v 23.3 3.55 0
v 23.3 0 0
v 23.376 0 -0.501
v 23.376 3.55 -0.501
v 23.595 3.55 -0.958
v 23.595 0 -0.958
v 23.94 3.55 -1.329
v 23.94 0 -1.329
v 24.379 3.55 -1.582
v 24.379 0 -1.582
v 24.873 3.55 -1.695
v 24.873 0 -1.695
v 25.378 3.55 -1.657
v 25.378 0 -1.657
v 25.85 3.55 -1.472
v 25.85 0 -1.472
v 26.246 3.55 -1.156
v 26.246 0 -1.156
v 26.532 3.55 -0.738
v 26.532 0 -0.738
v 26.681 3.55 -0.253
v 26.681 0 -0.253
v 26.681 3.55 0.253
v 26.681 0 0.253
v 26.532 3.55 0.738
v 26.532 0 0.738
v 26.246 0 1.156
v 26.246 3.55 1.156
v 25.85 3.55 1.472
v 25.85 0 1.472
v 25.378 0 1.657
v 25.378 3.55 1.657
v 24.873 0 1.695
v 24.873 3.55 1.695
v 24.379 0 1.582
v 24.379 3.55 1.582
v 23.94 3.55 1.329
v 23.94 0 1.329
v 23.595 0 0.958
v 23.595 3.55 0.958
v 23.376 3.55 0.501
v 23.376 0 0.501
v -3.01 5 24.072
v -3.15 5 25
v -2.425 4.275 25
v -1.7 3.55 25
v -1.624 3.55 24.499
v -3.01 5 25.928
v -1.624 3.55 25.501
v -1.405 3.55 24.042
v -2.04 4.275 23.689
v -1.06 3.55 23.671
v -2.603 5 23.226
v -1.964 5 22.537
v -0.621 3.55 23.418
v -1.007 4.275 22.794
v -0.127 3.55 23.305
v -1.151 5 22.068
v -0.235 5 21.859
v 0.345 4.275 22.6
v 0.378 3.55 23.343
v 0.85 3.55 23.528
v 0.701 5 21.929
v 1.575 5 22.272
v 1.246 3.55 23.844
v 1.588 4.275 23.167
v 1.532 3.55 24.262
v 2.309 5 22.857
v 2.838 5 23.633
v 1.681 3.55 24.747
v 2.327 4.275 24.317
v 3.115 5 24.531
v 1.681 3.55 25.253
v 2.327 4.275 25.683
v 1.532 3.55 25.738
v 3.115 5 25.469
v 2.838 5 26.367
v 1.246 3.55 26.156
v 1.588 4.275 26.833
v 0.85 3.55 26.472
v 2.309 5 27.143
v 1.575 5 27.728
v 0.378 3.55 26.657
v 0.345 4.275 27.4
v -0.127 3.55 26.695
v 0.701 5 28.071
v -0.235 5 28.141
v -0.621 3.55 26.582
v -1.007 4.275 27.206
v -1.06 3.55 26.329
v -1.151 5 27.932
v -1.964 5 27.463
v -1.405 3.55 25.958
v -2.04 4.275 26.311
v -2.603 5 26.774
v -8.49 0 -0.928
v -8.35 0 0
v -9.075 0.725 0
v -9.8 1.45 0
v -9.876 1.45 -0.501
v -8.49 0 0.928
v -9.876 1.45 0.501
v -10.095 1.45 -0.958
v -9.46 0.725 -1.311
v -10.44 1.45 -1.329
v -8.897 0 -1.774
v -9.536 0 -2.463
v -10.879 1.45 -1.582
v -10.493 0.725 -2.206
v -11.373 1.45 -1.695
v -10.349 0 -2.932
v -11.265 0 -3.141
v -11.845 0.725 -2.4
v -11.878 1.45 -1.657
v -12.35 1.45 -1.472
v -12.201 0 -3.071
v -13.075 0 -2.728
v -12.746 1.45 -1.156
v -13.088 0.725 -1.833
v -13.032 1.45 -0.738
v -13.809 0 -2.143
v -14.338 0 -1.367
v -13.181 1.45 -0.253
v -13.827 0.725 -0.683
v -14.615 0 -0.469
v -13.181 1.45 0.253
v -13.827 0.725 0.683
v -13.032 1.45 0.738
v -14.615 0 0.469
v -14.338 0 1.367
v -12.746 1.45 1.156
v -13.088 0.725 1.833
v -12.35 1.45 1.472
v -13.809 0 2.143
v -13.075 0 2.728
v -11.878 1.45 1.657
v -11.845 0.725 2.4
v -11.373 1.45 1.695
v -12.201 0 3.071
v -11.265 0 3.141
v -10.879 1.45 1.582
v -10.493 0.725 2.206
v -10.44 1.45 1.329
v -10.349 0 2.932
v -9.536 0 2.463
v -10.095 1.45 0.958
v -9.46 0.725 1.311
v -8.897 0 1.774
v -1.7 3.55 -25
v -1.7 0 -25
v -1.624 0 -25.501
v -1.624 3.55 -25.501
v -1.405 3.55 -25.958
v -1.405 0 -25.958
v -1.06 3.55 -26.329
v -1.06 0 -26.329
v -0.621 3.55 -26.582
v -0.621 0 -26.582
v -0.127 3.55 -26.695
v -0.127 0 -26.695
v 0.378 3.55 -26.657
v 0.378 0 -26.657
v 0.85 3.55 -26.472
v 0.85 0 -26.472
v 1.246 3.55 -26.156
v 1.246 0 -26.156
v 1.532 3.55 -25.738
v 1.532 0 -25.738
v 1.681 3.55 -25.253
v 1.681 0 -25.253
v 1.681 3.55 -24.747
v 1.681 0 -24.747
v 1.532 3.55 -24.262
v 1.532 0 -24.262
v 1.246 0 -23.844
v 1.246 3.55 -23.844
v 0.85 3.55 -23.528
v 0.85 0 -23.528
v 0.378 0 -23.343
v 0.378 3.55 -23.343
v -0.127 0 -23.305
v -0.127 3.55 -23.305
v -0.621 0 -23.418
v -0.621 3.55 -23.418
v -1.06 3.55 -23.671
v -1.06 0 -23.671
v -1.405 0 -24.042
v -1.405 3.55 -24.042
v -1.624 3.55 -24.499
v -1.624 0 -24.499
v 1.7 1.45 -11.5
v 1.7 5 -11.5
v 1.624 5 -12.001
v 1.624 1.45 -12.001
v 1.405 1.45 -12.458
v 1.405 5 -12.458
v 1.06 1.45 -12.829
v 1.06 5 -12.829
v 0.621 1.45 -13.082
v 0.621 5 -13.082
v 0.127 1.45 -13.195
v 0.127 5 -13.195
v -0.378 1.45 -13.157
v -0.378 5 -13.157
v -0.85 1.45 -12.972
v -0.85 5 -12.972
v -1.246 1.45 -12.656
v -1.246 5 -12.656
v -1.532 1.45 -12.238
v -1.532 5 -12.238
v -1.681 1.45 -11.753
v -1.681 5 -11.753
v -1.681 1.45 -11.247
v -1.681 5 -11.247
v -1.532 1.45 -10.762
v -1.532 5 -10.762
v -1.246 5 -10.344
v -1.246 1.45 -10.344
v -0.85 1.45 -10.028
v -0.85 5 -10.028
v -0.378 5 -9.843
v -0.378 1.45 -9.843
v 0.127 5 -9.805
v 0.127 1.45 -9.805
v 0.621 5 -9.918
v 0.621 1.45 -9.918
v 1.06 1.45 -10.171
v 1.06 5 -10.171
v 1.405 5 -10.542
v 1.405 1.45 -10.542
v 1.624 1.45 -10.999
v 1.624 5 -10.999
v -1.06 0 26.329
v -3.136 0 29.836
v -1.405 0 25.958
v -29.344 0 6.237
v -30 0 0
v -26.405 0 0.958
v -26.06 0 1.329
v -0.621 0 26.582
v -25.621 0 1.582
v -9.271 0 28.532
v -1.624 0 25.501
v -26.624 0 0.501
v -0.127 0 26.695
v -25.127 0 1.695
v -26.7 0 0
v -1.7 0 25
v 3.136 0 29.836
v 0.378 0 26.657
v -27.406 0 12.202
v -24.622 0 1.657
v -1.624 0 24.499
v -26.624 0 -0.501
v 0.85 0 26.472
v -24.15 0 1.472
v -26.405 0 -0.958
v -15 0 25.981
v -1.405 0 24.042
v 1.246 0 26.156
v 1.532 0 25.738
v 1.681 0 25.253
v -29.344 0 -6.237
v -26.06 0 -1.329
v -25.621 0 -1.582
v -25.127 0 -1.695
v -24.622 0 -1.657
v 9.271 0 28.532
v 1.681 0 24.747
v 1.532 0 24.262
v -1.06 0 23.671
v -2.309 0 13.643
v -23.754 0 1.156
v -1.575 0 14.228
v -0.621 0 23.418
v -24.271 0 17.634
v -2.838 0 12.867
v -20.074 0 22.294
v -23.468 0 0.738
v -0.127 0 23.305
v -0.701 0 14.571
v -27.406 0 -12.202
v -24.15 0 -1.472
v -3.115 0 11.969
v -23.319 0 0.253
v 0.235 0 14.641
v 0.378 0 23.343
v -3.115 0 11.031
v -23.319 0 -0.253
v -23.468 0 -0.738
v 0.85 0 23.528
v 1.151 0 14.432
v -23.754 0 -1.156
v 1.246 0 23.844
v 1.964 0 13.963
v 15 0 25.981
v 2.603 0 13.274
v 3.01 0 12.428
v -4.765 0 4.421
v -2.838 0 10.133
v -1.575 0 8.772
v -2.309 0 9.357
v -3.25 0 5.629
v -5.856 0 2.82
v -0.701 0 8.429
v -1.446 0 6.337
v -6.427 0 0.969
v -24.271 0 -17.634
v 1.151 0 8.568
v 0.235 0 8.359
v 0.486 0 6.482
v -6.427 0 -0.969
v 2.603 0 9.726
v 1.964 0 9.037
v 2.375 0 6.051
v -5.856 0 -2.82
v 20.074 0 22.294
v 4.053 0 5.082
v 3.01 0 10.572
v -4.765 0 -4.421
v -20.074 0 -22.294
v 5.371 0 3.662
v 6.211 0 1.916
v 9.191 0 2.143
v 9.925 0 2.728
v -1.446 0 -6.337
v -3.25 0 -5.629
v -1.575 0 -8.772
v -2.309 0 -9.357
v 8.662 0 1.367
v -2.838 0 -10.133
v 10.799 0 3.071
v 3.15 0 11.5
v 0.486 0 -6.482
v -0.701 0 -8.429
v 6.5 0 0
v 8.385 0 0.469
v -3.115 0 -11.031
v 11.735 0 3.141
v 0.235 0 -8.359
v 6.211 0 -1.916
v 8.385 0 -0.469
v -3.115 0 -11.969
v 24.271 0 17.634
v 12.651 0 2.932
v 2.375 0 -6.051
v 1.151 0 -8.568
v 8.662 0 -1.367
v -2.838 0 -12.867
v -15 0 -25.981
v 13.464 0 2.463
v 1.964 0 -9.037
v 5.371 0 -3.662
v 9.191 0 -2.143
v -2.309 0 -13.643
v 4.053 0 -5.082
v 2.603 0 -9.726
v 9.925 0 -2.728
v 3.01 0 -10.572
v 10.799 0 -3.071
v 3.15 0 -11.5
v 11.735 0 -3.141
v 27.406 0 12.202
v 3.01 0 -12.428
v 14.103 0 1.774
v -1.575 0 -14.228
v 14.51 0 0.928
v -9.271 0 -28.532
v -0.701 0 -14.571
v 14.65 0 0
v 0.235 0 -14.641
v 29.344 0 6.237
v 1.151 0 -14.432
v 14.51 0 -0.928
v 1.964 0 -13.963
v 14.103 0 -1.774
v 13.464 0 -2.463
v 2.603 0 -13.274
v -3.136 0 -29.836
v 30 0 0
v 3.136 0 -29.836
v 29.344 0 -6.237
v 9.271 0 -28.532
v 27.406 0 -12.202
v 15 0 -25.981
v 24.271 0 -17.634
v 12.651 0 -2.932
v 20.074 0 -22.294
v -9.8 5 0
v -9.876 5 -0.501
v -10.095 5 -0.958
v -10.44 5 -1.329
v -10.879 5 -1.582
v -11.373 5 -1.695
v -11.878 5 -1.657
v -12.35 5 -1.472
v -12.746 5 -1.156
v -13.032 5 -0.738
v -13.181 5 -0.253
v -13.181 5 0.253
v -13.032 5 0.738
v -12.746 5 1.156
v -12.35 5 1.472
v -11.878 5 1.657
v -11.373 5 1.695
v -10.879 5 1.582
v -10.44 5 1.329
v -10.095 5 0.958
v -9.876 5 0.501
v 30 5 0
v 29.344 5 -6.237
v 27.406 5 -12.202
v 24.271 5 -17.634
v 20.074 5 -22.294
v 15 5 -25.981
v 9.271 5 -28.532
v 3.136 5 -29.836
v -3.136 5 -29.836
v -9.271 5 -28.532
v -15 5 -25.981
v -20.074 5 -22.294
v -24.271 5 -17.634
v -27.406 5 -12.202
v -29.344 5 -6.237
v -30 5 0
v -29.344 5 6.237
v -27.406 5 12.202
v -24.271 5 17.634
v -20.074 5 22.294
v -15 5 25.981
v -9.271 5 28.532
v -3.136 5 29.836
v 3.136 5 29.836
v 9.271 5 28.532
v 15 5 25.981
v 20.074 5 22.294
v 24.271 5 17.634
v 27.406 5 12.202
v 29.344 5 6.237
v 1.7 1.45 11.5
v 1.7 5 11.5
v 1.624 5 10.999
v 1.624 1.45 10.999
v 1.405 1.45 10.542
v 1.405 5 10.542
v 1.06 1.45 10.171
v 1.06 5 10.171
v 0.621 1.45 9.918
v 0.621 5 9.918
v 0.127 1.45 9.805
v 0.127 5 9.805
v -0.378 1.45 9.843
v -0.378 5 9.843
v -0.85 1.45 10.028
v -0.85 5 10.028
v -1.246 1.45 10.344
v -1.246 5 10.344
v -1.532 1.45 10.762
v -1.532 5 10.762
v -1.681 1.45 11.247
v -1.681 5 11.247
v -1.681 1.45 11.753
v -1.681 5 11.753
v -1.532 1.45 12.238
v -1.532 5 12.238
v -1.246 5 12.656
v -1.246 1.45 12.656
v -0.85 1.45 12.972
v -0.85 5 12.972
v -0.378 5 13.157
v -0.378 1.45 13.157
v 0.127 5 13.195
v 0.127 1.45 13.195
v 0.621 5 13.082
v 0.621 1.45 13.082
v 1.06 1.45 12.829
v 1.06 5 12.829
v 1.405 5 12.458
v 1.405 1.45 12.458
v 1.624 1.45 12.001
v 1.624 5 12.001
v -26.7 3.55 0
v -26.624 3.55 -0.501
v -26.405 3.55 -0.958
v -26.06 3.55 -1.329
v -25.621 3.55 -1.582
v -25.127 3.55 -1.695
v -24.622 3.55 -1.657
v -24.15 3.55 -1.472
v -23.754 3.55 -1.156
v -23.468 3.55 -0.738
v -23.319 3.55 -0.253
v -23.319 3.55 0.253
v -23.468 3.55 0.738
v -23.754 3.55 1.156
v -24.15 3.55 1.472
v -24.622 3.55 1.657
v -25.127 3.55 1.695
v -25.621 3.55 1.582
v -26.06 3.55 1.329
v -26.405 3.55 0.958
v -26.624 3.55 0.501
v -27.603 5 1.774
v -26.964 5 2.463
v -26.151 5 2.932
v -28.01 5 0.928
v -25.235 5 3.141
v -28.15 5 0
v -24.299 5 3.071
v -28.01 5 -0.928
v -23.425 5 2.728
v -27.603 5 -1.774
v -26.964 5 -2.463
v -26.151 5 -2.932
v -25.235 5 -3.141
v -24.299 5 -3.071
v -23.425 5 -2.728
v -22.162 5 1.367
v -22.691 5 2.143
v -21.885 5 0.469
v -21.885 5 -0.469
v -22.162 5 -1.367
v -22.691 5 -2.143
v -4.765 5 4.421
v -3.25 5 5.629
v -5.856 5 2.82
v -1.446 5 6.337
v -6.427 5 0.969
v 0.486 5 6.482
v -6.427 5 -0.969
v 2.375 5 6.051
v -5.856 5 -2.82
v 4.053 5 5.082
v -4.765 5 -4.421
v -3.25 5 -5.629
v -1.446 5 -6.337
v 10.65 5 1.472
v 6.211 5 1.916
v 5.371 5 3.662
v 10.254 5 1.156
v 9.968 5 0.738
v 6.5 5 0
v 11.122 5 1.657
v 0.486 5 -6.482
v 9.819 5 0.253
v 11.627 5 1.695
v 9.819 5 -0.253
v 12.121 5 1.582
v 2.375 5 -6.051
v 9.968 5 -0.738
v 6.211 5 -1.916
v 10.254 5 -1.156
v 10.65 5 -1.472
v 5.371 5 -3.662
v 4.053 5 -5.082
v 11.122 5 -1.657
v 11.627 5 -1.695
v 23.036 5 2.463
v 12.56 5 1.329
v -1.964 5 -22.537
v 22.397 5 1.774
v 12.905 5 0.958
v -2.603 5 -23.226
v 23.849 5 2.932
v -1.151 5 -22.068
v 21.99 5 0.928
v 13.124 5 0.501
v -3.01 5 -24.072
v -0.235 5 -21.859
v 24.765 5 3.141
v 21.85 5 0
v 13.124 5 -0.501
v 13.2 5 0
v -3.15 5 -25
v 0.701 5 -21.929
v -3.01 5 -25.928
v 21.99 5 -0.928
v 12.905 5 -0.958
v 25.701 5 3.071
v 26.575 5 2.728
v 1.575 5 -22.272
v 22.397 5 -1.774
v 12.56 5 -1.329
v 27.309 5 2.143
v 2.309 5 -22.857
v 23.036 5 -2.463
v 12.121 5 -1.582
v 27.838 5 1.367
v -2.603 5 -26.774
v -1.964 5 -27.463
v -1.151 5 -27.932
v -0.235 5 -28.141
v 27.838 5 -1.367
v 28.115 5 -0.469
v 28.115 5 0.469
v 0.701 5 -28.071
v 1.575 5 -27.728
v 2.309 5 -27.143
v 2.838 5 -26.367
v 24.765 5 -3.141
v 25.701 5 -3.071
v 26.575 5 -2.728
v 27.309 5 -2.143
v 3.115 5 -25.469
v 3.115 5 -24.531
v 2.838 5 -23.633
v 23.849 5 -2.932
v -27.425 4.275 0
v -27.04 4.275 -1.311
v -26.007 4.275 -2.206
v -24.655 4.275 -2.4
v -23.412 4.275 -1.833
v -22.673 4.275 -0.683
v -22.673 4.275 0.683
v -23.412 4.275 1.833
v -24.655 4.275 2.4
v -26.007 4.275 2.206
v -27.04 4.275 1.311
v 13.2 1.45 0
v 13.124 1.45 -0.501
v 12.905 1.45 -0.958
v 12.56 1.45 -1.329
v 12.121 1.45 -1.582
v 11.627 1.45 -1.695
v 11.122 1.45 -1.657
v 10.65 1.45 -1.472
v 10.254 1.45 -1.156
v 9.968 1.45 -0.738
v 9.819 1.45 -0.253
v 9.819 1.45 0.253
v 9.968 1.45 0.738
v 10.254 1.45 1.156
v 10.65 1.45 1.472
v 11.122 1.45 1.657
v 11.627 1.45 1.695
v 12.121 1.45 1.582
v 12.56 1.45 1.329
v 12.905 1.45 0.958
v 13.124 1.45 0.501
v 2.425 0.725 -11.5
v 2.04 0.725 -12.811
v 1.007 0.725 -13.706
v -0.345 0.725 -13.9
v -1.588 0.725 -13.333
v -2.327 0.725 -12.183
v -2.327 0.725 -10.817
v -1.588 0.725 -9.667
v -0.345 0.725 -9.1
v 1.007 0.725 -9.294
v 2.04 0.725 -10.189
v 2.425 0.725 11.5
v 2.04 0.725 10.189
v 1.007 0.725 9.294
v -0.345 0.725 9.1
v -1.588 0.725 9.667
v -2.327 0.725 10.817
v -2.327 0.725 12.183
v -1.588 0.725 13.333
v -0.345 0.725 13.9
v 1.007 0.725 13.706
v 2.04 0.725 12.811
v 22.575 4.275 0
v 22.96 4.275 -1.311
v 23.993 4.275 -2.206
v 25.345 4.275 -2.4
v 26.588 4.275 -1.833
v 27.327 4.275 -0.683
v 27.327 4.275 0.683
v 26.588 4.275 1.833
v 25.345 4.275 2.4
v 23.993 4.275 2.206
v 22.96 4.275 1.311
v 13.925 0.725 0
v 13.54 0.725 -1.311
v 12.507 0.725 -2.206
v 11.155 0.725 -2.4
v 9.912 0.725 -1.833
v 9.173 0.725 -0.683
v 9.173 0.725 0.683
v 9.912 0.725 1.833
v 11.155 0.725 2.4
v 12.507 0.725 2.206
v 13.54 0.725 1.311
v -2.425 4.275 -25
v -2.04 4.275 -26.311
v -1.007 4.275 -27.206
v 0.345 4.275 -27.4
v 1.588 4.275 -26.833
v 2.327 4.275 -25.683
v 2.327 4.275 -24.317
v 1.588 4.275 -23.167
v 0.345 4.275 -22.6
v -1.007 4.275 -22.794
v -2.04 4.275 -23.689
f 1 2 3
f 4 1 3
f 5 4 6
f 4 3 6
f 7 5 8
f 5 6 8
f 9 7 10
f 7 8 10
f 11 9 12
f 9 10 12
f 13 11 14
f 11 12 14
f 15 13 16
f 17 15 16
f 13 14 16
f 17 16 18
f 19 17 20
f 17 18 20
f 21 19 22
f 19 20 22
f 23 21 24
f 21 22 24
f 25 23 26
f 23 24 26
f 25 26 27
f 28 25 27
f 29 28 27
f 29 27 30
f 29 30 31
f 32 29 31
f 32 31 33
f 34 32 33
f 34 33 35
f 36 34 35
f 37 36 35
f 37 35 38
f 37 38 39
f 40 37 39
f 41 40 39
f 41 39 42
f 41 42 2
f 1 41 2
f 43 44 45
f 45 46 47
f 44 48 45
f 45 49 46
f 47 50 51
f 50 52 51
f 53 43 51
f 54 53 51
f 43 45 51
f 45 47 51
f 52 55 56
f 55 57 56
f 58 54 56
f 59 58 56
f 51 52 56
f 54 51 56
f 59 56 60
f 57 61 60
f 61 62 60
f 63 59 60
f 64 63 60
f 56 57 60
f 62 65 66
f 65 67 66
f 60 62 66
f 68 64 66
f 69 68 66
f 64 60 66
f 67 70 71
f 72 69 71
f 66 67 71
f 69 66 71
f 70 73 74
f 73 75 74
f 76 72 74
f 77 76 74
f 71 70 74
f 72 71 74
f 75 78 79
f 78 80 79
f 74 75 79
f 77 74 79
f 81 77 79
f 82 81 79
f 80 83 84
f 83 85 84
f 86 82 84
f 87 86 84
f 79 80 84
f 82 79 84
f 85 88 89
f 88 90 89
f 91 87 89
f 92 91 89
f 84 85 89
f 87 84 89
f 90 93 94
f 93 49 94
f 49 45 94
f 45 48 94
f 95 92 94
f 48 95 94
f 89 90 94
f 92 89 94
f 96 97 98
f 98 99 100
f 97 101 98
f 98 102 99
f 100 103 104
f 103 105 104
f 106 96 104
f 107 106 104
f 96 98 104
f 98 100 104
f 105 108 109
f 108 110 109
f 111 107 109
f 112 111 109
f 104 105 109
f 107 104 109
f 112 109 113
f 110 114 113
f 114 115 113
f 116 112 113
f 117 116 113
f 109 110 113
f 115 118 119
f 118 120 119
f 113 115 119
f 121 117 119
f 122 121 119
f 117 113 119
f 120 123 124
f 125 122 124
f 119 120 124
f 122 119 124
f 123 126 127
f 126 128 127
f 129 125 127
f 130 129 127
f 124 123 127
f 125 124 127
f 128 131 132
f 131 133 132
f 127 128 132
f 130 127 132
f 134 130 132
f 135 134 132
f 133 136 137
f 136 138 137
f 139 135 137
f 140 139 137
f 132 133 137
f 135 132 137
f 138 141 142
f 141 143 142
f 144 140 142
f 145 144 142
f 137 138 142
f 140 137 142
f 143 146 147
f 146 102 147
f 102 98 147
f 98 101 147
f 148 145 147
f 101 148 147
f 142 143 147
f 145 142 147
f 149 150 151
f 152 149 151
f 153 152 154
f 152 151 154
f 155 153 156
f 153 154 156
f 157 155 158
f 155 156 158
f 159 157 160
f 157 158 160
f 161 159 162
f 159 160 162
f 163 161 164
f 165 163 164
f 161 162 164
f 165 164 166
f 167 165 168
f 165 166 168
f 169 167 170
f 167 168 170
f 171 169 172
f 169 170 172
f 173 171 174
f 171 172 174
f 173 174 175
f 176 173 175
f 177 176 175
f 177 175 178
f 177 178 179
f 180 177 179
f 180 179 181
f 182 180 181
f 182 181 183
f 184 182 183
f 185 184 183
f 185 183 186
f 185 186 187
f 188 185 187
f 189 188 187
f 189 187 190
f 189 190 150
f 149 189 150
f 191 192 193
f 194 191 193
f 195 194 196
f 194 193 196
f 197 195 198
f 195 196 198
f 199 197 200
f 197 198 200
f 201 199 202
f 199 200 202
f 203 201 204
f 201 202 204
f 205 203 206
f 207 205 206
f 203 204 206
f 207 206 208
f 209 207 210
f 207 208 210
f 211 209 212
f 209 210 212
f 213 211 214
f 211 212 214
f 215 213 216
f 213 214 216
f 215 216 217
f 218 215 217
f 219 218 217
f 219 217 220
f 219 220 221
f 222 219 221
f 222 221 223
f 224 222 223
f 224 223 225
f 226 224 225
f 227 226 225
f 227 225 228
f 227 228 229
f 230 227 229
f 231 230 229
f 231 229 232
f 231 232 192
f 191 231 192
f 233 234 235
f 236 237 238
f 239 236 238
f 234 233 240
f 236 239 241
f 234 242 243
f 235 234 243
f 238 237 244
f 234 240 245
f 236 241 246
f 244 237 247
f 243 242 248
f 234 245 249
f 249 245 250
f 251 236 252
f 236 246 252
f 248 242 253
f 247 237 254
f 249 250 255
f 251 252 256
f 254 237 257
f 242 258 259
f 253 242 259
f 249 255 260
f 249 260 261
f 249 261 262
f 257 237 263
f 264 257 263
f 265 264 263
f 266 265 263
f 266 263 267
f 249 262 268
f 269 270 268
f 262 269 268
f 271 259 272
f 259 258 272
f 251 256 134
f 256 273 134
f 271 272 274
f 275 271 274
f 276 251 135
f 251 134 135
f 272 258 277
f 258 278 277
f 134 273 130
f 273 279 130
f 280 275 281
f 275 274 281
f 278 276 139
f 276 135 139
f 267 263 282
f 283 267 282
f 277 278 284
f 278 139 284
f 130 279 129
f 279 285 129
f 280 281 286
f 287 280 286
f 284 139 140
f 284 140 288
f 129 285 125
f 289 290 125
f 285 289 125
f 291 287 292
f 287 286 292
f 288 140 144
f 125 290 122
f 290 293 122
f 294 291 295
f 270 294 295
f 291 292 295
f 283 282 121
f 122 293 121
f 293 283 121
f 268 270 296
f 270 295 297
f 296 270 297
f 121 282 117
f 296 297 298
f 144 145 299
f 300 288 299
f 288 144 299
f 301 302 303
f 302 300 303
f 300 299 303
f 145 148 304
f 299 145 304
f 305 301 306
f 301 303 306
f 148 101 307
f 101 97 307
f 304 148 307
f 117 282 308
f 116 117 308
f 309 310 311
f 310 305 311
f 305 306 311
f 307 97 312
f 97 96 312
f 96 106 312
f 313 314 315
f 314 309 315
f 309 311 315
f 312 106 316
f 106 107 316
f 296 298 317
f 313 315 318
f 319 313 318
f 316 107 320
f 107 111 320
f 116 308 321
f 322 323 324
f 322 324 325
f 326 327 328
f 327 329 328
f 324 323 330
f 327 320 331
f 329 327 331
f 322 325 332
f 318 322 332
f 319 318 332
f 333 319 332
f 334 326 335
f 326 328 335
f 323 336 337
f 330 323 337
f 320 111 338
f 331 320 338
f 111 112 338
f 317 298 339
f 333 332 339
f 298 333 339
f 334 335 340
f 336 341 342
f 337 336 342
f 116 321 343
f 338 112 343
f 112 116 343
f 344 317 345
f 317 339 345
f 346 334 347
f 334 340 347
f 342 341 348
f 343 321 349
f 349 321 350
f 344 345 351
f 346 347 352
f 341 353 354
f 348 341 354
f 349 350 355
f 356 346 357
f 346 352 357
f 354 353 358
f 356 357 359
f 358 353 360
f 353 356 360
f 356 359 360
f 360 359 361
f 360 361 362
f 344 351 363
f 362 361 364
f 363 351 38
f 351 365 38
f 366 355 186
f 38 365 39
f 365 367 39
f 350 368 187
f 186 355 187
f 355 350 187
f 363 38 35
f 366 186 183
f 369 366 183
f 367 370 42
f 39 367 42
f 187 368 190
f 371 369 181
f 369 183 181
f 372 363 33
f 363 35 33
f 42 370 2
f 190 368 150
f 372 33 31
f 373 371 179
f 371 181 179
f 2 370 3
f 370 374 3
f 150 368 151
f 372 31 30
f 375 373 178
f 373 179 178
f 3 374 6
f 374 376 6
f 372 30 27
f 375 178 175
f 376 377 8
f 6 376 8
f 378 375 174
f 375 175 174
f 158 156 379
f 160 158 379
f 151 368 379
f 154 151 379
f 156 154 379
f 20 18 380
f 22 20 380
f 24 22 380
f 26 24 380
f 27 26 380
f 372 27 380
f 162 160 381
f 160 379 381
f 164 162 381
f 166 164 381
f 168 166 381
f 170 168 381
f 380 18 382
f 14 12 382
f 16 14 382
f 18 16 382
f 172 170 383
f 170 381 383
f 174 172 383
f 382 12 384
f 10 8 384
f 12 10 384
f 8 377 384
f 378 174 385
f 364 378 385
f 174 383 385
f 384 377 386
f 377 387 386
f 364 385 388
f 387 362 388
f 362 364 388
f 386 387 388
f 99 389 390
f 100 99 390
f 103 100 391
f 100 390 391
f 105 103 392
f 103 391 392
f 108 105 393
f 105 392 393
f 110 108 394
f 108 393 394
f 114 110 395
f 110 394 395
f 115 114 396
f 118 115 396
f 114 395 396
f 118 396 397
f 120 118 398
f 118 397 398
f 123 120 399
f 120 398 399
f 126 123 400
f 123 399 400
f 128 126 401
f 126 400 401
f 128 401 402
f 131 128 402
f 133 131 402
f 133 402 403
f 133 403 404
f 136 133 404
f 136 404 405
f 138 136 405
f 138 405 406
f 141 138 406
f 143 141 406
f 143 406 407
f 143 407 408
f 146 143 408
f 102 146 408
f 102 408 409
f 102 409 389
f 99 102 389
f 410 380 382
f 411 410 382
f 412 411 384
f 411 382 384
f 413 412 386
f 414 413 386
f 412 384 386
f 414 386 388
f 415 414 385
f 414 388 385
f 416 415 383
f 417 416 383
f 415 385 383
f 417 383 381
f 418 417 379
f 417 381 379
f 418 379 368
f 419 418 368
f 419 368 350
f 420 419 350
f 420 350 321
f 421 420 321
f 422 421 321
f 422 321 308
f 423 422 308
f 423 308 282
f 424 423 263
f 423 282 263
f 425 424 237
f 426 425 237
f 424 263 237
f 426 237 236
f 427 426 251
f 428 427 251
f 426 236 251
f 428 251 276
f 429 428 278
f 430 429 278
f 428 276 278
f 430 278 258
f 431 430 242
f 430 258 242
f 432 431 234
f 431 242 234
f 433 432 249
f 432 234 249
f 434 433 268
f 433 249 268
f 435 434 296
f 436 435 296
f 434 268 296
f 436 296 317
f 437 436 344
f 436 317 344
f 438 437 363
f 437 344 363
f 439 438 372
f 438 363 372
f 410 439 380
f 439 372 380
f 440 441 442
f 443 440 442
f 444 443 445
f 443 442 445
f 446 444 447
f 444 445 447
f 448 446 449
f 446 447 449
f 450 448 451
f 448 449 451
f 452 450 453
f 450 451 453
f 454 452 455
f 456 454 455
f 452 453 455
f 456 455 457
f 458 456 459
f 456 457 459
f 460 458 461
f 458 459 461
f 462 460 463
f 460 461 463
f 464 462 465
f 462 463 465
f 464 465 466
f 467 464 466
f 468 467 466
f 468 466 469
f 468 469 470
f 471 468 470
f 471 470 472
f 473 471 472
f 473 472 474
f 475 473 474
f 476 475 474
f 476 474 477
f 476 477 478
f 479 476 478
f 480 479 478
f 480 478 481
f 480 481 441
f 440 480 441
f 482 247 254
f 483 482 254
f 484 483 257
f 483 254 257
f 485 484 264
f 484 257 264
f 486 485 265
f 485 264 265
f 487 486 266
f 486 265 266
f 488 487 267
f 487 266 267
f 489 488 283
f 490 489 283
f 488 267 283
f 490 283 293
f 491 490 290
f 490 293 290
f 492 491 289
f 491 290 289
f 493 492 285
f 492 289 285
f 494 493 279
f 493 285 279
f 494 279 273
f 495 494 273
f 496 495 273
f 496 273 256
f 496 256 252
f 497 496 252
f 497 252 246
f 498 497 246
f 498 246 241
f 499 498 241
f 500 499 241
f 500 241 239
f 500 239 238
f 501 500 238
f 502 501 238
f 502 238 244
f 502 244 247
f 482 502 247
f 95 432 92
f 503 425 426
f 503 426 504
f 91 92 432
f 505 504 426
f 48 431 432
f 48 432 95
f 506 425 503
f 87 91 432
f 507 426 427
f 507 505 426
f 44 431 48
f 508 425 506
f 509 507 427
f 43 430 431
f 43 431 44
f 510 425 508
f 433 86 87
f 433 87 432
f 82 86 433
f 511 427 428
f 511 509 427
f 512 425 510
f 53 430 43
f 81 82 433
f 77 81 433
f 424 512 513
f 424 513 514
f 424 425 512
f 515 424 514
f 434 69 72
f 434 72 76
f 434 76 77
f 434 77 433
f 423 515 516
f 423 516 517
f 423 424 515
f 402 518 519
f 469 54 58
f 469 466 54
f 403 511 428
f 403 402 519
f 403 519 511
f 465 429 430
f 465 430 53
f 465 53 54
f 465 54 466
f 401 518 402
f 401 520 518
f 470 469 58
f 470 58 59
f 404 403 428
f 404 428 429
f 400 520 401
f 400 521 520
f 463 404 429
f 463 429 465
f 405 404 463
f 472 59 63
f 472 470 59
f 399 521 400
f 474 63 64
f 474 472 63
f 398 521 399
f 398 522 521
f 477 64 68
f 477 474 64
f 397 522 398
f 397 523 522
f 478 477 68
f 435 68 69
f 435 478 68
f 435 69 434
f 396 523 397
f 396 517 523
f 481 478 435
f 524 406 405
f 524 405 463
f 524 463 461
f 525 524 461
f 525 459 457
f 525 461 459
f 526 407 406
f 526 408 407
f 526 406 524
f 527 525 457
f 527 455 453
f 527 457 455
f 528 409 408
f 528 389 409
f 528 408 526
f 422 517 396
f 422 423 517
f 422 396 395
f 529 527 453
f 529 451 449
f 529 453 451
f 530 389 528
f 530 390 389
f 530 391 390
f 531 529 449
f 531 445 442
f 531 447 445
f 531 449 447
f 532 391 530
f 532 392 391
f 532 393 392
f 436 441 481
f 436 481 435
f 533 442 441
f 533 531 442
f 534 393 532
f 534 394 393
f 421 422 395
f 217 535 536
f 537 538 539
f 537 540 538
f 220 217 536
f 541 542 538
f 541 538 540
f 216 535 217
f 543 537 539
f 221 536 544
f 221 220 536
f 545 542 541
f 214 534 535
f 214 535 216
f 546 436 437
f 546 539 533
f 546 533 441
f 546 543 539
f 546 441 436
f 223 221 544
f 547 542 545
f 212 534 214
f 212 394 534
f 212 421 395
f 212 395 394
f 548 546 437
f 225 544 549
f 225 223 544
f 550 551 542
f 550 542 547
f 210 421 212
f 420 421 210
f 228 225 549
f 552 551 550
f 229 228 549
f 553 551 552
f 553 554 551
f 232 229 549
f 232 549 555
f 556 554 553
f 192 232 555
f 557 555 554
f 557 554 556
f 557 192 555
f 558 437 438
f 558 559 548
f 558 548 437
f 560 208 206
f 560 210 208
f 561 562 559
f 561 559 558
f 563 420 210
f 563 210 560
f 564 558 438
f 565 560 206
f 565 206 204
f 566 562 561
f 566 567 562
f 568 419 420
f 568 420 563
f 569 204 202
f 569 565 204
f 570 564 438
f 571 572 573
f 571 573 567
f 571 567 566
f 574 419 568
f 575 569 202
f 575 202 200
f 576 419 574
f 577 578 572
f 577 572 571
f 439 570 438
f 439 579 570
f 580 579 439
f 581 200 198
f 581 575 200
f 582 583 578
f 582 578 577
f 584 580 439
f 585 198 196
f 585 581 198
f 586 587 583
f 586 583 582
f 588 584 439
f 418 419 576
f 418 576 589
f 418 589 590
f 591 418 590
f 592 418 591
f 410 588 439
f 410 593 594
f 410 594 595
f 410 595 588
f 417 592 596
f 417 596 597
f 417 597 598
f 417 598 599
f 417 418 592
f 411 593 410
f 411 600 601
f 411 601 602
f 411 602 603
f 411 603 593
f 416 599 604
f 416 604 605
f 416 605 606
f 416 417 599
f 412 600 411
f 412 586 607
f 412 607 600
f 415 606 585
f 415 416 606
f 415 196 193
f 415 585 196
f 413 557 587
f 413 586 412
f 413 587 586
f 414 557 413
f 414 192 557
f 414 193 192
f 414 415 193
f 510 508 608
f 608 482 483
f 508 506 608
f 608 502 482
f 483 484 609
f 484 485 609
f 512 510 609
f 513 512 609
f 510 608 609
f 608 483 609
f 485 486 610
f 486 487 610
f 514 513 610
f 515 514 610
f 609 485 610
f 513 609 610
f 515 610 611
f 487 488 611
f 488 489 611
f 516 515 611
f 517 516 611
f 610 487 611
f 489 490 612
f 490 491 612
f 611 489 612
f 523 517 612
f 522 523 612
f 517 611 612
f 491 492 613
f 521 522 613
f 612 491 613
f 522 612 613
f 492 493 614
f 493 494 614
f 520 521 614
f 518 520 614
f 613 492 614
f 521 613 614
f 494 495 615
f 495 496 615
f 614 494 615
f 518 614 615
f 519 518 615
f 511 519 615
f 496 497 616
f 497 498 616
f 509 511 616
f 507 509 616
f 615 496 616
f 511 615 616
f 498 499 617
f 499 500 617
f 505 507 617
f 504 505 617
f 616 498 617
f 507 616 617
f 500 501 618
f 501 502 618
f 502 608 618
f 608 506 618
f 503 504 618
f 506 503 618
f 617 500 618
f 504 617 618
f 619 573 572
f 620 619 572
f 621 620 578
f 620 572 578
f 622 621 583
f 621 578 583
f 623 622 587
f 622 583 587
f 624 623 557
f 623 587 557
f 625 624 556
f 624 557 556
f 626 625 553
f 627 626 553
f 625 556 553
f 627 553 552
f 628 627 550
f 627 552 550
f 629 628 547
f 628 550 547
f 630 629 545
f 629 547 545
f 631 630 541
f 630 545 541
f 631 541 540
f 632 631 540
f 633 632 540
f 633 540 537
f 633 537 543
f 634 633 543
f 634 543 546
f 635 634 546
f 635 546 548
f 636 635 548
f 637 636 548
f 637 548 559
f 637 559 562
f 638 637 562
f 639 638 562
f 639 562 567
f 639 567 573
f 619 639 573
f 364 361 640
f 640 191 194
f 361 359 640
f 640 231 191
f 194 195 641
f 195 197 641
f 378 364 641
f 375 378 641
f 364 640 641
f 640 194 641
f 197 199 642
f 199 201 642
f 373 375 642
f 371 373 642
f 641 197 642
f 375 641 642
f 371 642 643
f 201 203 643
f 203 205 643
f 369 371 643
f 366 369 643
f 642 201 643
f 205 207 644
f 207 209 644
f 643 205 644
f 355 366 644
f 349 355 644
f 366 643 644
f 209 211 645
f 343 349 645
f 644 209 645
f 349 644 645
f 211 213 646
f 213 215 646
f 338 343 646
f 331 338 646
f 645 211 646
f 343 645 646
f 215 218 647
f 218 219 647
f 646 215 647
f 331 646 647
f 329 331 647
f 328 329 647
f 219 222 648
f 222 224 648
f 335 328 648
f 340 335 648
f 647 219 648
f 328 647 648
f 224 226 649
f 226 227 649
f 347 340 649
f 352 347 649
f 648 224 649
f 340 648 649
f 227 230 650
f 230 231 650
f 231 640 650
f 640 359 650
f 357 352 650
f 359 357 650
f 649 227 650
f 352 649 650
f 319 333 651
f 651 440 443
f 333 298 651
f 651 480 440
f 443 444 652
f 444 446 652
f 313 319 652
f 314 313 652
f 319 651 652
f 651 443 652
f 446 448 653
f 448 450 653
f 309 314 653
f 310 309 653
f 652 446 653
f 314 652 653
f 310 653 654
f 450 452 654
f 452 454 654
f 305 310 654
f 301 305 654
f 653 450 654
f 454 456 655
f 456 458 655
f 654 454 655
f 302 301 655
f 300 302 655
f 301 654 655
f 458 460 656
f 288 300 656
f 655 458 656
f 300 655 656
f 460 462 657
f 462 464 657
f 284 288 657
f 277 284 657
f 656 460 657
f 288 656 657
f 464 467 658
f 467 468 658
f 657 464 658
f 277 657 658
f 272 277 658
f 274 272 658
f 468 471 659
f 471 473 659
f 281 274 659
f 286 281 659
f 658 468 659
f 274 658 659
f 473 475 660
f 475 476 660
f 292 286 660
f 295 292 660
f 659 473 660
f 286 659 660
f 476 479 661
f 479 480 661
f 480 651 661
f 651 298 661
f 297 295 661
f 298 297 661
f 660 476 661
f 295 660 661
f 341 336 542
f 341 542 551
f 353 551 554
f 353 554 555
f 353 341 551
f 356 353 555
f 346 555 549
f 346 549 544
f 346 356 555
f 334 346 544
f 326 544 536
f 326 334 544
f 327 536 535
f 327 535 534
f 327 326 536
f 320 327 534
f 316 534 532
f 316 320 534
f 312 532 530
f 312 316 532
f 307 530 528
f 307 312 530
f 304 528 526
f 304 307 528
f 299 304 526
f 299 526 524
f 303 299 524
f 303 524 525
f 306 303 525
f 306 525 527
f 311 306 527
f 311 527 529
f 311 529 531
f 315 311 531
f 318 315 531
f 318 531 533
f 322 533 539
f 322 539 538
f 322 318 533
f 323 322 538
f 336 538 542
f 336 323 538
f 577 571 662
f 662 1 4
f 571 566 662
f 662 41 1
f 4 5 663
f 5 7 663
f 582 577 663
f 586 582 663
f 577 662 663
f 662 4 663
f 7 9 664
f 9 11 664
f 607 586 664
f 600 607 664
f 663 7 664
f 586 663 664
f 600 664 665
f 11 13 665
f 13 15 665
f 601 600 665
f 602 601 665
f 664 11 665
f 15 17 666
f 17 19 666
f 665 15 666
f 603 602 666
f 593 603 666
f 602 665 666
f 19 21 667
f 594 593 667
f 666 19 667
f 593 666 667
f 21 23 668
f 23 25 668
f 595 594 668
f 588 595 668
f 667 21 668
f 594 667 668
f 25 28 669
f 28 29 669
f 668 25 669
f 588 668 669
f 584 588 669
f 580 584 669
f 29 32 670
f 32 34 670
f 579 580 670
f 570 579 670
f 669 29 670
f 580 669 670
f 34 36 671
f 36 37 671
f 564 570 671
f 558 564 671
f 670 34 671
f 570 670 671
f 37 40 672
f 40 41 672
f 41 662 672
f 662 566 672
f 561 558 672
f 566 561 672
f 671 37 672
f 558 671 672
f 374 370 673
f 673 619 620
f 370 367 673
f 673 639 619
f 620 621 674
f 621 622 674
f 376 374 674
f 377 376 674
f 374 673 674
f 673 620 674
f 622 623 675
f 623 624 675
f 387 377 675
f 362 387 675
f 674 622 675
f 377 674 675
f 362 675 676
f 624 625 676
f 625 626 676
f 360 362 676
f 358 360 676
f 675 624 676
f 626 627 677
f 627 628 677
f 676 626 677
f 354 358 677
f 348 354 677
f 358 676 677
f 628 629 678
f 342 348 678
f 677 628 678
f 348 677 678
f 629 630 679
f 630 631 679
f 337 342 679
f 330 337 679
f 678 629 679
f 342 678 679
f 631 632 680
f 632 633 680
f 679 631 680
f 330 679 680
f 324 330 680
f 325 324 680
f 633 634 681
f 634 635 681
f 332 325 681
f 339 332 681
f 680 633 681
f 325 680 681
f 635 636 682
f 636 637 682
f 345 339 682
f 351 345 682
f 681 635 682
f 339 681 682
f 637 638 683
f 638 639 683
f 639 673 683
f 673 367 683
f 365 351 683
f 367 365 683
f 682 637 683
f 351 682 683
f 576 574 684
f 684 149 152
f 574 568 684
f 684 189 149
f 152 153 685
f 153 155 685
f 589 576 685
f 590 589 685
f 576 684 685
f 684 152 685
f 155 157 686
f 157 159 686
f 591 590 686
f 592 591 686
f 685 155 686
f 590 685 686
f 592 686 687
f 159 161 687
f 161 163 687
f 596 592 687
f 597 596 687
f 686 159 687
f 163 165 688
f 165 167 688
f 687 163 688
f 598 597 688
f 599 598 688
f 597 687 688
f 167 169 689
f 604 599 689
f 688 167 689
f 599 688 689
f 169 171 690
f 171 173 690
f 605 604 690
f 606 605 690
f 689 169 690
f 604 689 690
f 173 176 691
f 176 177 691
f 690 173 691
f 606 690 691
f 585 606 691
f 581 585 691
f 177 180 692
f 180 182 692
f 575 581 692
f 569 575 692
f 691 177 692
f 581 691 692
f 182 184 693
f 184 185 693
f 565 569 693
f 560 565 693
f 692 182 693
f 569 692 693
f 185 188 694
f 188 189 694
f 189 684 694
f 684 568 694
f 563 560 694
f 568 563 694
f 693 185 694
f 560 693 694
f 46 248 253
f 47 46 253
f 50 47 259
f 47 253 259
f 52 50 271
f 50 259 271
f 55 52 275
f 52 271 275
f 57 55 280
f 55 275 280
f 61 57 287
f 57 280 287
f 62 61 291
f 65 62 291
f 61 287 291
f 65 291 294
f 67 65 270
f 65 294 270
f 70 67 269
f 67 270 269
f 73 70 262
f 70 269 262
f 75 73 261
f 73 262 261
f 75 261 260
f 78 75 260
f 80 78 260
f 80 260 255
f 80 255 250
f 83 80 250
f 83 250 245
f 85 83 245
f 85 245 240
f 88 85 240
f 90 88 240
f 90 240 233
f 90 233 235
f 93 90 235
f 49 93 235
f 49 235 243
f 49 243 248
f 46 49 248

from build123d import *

# Parameters (mm, degrees)
SKETCH1_R                                           = 30
SKETCH1_R_2                                         = 6.5
BOSS_EXTRUDE1_DEPTH                                 = 5
CSK_FOR_M3_COUNTERSUNK_FLAT_HEAD_SCREW1_D           = 3.4
CSK_FOR_M3_COUNTERSUNK_FLAT_HEAD_SCREW1_DEPTH       = 5
CSK_FOR_M3_COUNTERSUNK_FLAT_HEAD_SCREW1_CSINK_D     = 6.3
CSK_FOR_M3_COUNTERSUNK_FLAT_HEAD_SCREW1_CSINK_ANGLE = 90
CSK_FOR_M3_COUNTERSUNK_FLAT_HEAD_SCREW2_D           = 3.4
CSK_FOR_M3_COUNTERSUNK_FLAT_HEAD_SCREW2_DEPTH       = 5
CSK_FOR_M3_COUNTERSUNK_FLAT_HEAD_SCREW2_CSINK_D     = 6.3
CSK_FOR_M3_COUNTERSUNK_FLAT_HEAD_SCREW2_CSINK_ANGLE = 90


with BuildPart() as part:
    # Sketch1 → Boss-Extrude1 (new body)
    with BuildSketch(Plane(origin=(0, 0, 0), x_dir=(1, 0, 0), z_dir=(0, 1, 0))):
        Circle(SKETCH1_R)
        Circle(SKETCH1_R_2, mode=Mode.SUBTRACT)
    extrude(amount=BOSS_EXTRUDE1_DEPTH)

    # CSK for M3 Countersunk Flat Head Screw1
    with Locations(Plane(origin=(0, 5, 0), x_dir=(1, 0, 0), z_dir=(0, 1, 0))):
        with Locations((0, 25), (-25, 0), (0, -25), (25, 0)):
            CounterSinkHole(CSK_FOR_M3_COUNTERSUNK_FLAT_HEAD_SCREW1_D / 2, CSK_FOR_M3_COUNTERSUNK_FLAT_HEAD_SCREW1_CSINK_D / 2, depth=CSK_FOR_M3_COUNTERSUNK_FLAT_HEAD_SCREW1_DEPTH, counter_sink_angle=CSK_FOR_M3_COUNTERSUNK_FLAT_HEAD_SCREW1_CSINK_ANGLE)

    # CSK for M3 Countersunk Flat Head Screw2
    with Locations(Plane(origin=(0, 0, 0), x_dir=(-1, 0, 0), z_dir=(0, -1, 0))):
        with Locations((0, 11.5), (-11.5, 0), (0, -11.5), (11.5, 0)):
            CounterSinkHole(CSK_FOR_M3_COUNTERSUNK_FLAT_HEAD_SCREW2_D / 2, CSK_FOR_M3_COUNTERSUNK_FLAT_HEAD_SCREW2_CSINK_D / 2, depth=CSK_FOR_M3_COUNTERSUNK_FLAT_HEAD_SCREW2_DEPTH, counter_sink_angle=CSK_FOR_M3_COUNTERSUNK_FLAT_HEAD_SCREW2_CSINK_ANGLE)


solid = part.part
